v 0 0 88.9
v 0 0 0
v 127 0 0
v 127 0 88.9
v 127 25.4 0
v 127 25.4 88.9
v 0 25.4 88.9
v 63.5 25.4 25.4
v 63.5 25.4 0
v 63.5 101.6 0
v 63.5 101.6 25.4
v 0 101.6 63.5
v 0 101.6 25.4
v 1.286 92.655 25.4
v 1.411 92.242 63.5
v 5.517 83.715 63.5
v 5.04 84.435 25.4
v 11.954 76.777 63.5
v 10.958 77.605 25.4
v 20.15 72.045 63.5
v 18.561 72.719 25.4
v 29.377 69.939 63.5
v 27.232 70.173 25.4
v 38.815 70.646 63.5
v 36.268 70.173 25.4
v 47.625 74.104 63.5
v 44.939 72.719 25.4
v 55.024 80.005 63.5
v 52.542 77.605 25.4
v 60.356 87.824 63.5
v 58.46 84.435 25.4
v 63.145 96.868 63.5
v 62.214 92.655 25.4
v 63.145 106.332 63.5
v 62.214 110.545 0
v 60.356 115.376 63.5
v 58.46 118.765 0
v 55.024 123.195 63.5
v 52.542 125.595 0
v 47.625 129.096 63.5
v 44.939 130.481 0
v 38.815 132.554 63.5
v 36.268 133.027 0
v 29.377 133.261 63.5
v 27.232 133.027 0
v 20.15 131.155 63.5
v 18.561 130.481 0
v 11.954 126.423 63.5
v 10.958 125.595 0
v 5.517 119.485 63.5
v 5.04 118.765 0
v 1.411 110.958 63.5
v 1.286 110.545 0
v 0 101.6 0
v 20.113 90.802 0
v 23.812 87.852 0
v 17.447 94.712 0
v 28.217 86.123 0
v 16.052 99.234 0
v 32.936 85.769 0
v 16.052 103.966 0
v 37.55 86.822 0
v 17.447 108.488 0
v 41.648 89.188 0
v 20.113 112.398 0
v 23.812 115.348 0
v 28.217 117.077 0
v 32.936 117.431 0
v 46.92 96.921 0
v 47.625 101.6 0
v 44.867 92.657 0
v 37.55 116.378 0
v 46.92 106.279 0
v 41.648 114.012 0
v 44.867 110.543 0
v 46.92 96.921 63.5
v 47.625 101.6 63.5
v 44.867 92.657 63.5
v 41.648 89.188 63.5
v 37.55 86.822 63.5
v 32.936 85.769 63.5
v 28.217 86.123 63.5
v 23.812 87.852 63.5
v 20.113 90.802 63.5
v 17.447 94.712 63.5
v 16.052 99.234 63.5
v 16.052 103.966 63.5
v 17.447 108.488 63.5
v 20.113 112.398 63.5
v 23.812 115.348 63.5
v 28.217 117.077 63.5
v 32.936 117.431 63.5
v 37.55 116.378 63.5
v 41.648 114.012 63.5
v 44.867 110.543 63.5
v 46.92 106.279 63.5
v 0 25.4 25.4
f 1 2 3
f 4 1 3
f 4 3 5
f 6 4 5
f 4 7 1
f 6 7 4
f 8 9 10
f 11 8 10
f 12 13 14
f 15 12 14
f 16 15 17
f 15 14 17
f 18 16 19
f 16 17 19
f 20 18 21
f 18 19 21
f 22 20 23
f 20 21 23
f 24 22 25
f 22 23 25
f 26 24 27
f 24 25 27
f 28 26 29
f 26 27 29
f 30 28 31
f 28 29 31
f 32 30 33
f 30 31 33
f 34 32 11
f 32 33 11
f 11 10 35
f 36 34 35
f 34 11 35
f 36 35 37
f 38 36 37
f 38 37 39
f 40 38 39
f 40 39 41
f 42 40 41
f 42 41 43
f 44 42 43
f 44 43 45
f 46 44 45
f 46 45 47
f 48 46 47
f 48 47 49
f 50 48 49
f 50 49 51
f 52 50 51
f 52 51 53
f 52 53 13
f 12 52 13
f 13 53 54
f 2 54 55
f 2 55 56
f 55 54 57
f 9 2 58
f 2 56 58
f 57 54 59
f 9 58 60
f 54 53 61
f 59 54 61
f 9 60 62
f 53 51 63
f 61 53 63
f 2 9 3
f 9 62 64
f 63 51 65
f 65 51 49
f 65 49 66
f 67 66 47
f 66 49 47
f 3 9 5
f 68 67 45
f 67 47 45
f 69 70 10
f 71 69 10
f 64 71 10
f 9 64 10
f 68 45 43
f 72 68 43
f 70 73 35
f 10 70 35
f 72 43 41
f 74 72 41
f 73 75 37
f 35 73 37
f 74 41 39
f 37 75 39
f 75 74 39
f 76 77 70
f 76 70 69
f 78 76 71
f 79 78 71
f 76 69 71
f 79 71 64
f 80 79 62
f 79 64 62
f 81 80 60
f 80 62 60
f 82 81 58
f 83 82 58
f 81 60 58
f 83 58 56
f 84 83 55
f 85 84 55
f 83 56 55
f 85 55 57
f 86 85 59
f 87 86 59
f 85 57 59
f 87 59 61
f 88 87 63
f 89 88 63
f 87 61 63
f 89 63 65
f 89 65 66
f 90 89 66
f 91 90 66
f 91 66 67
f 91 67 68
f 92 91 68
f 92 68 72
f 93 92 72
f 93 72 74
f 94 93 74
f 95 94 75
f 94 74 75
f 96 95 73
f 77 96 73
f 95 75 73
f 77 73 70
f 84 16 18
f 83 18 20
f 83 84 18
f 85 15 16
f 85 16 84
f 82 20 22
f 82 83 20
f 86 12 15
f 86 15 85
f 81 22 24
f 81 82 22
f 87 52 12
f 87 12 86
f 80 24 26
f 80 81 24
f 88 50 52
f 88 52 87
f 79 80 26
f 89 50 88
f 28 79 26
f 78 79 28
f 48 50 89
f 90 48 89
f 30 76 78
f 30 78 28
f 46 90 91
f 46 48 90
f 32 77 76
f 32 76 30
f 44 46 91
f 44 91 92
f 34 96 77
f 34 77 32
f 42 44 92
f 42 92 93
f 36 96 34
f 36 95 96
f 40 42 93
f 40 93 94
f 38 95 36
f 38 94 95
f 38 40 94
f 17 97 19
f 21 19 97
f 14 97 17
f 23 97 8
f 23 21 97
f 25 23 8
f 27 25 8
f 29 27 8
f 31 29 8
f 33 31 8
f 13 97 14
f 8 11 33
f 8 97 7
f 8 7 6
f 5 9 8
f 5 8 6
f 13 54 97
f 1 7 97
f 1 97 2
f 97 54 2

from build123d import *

# Parameters (mm, degrees)
SKETCH1_W           = 127
SKETCH1_H           = 25.4
BOSS_EXTRUDE1_DEPTH = 88.9
BOSS_EXTRUDE2_DEPTH = 25.4
SKETCH1_4_R         = 31.75
SKETCH1_4_R_2       = 15.875
BOSS_EXTRUDE3_DEPTH = 63.5


with BuildPart() as part:
    # Sketch1 → Boss-Extrude1 (new body)
    with BuildSketch(Plane.XY):
        with Locations((63.5, 12.7)):
            Rectangle(SKETCH1_W, SKETCH1_H)
    extrude(amount=BOSS_EXTRUDE1_DEPTH)

    # Sketch1<3> → Boss-Extrude2 (add)
    with BuildSketch(Plane.XY):
        with BuildLine():
            Line((0, 101.6), (0, 25.4))
            Line((0, 25.4), (63.5, 25.4))
            Line((63.5, 25.4), (63.5, 101.6))
            ThreePointArc((63.5, 101.6), (31.75, 69.85), (0, 101.6))
        make_face()
    extrude(amount=BOSS_EXTRUDE2_DEPTH)

    # Sketch1<4> → Boss-Extrude3 (add)
    with BuildSketch(Plane.XY):
        with Locations((31.75, 101.6)):
            Circle(SKETCH1_4_R)
        with Locations((31.75, 101.6)):
            Circle(SKETCH1_4_R_2, mode=Mode.SUBTRACT)
    extrude(amount=BOSS_EXTRUDE3_DEPTH)


solid = part.part
